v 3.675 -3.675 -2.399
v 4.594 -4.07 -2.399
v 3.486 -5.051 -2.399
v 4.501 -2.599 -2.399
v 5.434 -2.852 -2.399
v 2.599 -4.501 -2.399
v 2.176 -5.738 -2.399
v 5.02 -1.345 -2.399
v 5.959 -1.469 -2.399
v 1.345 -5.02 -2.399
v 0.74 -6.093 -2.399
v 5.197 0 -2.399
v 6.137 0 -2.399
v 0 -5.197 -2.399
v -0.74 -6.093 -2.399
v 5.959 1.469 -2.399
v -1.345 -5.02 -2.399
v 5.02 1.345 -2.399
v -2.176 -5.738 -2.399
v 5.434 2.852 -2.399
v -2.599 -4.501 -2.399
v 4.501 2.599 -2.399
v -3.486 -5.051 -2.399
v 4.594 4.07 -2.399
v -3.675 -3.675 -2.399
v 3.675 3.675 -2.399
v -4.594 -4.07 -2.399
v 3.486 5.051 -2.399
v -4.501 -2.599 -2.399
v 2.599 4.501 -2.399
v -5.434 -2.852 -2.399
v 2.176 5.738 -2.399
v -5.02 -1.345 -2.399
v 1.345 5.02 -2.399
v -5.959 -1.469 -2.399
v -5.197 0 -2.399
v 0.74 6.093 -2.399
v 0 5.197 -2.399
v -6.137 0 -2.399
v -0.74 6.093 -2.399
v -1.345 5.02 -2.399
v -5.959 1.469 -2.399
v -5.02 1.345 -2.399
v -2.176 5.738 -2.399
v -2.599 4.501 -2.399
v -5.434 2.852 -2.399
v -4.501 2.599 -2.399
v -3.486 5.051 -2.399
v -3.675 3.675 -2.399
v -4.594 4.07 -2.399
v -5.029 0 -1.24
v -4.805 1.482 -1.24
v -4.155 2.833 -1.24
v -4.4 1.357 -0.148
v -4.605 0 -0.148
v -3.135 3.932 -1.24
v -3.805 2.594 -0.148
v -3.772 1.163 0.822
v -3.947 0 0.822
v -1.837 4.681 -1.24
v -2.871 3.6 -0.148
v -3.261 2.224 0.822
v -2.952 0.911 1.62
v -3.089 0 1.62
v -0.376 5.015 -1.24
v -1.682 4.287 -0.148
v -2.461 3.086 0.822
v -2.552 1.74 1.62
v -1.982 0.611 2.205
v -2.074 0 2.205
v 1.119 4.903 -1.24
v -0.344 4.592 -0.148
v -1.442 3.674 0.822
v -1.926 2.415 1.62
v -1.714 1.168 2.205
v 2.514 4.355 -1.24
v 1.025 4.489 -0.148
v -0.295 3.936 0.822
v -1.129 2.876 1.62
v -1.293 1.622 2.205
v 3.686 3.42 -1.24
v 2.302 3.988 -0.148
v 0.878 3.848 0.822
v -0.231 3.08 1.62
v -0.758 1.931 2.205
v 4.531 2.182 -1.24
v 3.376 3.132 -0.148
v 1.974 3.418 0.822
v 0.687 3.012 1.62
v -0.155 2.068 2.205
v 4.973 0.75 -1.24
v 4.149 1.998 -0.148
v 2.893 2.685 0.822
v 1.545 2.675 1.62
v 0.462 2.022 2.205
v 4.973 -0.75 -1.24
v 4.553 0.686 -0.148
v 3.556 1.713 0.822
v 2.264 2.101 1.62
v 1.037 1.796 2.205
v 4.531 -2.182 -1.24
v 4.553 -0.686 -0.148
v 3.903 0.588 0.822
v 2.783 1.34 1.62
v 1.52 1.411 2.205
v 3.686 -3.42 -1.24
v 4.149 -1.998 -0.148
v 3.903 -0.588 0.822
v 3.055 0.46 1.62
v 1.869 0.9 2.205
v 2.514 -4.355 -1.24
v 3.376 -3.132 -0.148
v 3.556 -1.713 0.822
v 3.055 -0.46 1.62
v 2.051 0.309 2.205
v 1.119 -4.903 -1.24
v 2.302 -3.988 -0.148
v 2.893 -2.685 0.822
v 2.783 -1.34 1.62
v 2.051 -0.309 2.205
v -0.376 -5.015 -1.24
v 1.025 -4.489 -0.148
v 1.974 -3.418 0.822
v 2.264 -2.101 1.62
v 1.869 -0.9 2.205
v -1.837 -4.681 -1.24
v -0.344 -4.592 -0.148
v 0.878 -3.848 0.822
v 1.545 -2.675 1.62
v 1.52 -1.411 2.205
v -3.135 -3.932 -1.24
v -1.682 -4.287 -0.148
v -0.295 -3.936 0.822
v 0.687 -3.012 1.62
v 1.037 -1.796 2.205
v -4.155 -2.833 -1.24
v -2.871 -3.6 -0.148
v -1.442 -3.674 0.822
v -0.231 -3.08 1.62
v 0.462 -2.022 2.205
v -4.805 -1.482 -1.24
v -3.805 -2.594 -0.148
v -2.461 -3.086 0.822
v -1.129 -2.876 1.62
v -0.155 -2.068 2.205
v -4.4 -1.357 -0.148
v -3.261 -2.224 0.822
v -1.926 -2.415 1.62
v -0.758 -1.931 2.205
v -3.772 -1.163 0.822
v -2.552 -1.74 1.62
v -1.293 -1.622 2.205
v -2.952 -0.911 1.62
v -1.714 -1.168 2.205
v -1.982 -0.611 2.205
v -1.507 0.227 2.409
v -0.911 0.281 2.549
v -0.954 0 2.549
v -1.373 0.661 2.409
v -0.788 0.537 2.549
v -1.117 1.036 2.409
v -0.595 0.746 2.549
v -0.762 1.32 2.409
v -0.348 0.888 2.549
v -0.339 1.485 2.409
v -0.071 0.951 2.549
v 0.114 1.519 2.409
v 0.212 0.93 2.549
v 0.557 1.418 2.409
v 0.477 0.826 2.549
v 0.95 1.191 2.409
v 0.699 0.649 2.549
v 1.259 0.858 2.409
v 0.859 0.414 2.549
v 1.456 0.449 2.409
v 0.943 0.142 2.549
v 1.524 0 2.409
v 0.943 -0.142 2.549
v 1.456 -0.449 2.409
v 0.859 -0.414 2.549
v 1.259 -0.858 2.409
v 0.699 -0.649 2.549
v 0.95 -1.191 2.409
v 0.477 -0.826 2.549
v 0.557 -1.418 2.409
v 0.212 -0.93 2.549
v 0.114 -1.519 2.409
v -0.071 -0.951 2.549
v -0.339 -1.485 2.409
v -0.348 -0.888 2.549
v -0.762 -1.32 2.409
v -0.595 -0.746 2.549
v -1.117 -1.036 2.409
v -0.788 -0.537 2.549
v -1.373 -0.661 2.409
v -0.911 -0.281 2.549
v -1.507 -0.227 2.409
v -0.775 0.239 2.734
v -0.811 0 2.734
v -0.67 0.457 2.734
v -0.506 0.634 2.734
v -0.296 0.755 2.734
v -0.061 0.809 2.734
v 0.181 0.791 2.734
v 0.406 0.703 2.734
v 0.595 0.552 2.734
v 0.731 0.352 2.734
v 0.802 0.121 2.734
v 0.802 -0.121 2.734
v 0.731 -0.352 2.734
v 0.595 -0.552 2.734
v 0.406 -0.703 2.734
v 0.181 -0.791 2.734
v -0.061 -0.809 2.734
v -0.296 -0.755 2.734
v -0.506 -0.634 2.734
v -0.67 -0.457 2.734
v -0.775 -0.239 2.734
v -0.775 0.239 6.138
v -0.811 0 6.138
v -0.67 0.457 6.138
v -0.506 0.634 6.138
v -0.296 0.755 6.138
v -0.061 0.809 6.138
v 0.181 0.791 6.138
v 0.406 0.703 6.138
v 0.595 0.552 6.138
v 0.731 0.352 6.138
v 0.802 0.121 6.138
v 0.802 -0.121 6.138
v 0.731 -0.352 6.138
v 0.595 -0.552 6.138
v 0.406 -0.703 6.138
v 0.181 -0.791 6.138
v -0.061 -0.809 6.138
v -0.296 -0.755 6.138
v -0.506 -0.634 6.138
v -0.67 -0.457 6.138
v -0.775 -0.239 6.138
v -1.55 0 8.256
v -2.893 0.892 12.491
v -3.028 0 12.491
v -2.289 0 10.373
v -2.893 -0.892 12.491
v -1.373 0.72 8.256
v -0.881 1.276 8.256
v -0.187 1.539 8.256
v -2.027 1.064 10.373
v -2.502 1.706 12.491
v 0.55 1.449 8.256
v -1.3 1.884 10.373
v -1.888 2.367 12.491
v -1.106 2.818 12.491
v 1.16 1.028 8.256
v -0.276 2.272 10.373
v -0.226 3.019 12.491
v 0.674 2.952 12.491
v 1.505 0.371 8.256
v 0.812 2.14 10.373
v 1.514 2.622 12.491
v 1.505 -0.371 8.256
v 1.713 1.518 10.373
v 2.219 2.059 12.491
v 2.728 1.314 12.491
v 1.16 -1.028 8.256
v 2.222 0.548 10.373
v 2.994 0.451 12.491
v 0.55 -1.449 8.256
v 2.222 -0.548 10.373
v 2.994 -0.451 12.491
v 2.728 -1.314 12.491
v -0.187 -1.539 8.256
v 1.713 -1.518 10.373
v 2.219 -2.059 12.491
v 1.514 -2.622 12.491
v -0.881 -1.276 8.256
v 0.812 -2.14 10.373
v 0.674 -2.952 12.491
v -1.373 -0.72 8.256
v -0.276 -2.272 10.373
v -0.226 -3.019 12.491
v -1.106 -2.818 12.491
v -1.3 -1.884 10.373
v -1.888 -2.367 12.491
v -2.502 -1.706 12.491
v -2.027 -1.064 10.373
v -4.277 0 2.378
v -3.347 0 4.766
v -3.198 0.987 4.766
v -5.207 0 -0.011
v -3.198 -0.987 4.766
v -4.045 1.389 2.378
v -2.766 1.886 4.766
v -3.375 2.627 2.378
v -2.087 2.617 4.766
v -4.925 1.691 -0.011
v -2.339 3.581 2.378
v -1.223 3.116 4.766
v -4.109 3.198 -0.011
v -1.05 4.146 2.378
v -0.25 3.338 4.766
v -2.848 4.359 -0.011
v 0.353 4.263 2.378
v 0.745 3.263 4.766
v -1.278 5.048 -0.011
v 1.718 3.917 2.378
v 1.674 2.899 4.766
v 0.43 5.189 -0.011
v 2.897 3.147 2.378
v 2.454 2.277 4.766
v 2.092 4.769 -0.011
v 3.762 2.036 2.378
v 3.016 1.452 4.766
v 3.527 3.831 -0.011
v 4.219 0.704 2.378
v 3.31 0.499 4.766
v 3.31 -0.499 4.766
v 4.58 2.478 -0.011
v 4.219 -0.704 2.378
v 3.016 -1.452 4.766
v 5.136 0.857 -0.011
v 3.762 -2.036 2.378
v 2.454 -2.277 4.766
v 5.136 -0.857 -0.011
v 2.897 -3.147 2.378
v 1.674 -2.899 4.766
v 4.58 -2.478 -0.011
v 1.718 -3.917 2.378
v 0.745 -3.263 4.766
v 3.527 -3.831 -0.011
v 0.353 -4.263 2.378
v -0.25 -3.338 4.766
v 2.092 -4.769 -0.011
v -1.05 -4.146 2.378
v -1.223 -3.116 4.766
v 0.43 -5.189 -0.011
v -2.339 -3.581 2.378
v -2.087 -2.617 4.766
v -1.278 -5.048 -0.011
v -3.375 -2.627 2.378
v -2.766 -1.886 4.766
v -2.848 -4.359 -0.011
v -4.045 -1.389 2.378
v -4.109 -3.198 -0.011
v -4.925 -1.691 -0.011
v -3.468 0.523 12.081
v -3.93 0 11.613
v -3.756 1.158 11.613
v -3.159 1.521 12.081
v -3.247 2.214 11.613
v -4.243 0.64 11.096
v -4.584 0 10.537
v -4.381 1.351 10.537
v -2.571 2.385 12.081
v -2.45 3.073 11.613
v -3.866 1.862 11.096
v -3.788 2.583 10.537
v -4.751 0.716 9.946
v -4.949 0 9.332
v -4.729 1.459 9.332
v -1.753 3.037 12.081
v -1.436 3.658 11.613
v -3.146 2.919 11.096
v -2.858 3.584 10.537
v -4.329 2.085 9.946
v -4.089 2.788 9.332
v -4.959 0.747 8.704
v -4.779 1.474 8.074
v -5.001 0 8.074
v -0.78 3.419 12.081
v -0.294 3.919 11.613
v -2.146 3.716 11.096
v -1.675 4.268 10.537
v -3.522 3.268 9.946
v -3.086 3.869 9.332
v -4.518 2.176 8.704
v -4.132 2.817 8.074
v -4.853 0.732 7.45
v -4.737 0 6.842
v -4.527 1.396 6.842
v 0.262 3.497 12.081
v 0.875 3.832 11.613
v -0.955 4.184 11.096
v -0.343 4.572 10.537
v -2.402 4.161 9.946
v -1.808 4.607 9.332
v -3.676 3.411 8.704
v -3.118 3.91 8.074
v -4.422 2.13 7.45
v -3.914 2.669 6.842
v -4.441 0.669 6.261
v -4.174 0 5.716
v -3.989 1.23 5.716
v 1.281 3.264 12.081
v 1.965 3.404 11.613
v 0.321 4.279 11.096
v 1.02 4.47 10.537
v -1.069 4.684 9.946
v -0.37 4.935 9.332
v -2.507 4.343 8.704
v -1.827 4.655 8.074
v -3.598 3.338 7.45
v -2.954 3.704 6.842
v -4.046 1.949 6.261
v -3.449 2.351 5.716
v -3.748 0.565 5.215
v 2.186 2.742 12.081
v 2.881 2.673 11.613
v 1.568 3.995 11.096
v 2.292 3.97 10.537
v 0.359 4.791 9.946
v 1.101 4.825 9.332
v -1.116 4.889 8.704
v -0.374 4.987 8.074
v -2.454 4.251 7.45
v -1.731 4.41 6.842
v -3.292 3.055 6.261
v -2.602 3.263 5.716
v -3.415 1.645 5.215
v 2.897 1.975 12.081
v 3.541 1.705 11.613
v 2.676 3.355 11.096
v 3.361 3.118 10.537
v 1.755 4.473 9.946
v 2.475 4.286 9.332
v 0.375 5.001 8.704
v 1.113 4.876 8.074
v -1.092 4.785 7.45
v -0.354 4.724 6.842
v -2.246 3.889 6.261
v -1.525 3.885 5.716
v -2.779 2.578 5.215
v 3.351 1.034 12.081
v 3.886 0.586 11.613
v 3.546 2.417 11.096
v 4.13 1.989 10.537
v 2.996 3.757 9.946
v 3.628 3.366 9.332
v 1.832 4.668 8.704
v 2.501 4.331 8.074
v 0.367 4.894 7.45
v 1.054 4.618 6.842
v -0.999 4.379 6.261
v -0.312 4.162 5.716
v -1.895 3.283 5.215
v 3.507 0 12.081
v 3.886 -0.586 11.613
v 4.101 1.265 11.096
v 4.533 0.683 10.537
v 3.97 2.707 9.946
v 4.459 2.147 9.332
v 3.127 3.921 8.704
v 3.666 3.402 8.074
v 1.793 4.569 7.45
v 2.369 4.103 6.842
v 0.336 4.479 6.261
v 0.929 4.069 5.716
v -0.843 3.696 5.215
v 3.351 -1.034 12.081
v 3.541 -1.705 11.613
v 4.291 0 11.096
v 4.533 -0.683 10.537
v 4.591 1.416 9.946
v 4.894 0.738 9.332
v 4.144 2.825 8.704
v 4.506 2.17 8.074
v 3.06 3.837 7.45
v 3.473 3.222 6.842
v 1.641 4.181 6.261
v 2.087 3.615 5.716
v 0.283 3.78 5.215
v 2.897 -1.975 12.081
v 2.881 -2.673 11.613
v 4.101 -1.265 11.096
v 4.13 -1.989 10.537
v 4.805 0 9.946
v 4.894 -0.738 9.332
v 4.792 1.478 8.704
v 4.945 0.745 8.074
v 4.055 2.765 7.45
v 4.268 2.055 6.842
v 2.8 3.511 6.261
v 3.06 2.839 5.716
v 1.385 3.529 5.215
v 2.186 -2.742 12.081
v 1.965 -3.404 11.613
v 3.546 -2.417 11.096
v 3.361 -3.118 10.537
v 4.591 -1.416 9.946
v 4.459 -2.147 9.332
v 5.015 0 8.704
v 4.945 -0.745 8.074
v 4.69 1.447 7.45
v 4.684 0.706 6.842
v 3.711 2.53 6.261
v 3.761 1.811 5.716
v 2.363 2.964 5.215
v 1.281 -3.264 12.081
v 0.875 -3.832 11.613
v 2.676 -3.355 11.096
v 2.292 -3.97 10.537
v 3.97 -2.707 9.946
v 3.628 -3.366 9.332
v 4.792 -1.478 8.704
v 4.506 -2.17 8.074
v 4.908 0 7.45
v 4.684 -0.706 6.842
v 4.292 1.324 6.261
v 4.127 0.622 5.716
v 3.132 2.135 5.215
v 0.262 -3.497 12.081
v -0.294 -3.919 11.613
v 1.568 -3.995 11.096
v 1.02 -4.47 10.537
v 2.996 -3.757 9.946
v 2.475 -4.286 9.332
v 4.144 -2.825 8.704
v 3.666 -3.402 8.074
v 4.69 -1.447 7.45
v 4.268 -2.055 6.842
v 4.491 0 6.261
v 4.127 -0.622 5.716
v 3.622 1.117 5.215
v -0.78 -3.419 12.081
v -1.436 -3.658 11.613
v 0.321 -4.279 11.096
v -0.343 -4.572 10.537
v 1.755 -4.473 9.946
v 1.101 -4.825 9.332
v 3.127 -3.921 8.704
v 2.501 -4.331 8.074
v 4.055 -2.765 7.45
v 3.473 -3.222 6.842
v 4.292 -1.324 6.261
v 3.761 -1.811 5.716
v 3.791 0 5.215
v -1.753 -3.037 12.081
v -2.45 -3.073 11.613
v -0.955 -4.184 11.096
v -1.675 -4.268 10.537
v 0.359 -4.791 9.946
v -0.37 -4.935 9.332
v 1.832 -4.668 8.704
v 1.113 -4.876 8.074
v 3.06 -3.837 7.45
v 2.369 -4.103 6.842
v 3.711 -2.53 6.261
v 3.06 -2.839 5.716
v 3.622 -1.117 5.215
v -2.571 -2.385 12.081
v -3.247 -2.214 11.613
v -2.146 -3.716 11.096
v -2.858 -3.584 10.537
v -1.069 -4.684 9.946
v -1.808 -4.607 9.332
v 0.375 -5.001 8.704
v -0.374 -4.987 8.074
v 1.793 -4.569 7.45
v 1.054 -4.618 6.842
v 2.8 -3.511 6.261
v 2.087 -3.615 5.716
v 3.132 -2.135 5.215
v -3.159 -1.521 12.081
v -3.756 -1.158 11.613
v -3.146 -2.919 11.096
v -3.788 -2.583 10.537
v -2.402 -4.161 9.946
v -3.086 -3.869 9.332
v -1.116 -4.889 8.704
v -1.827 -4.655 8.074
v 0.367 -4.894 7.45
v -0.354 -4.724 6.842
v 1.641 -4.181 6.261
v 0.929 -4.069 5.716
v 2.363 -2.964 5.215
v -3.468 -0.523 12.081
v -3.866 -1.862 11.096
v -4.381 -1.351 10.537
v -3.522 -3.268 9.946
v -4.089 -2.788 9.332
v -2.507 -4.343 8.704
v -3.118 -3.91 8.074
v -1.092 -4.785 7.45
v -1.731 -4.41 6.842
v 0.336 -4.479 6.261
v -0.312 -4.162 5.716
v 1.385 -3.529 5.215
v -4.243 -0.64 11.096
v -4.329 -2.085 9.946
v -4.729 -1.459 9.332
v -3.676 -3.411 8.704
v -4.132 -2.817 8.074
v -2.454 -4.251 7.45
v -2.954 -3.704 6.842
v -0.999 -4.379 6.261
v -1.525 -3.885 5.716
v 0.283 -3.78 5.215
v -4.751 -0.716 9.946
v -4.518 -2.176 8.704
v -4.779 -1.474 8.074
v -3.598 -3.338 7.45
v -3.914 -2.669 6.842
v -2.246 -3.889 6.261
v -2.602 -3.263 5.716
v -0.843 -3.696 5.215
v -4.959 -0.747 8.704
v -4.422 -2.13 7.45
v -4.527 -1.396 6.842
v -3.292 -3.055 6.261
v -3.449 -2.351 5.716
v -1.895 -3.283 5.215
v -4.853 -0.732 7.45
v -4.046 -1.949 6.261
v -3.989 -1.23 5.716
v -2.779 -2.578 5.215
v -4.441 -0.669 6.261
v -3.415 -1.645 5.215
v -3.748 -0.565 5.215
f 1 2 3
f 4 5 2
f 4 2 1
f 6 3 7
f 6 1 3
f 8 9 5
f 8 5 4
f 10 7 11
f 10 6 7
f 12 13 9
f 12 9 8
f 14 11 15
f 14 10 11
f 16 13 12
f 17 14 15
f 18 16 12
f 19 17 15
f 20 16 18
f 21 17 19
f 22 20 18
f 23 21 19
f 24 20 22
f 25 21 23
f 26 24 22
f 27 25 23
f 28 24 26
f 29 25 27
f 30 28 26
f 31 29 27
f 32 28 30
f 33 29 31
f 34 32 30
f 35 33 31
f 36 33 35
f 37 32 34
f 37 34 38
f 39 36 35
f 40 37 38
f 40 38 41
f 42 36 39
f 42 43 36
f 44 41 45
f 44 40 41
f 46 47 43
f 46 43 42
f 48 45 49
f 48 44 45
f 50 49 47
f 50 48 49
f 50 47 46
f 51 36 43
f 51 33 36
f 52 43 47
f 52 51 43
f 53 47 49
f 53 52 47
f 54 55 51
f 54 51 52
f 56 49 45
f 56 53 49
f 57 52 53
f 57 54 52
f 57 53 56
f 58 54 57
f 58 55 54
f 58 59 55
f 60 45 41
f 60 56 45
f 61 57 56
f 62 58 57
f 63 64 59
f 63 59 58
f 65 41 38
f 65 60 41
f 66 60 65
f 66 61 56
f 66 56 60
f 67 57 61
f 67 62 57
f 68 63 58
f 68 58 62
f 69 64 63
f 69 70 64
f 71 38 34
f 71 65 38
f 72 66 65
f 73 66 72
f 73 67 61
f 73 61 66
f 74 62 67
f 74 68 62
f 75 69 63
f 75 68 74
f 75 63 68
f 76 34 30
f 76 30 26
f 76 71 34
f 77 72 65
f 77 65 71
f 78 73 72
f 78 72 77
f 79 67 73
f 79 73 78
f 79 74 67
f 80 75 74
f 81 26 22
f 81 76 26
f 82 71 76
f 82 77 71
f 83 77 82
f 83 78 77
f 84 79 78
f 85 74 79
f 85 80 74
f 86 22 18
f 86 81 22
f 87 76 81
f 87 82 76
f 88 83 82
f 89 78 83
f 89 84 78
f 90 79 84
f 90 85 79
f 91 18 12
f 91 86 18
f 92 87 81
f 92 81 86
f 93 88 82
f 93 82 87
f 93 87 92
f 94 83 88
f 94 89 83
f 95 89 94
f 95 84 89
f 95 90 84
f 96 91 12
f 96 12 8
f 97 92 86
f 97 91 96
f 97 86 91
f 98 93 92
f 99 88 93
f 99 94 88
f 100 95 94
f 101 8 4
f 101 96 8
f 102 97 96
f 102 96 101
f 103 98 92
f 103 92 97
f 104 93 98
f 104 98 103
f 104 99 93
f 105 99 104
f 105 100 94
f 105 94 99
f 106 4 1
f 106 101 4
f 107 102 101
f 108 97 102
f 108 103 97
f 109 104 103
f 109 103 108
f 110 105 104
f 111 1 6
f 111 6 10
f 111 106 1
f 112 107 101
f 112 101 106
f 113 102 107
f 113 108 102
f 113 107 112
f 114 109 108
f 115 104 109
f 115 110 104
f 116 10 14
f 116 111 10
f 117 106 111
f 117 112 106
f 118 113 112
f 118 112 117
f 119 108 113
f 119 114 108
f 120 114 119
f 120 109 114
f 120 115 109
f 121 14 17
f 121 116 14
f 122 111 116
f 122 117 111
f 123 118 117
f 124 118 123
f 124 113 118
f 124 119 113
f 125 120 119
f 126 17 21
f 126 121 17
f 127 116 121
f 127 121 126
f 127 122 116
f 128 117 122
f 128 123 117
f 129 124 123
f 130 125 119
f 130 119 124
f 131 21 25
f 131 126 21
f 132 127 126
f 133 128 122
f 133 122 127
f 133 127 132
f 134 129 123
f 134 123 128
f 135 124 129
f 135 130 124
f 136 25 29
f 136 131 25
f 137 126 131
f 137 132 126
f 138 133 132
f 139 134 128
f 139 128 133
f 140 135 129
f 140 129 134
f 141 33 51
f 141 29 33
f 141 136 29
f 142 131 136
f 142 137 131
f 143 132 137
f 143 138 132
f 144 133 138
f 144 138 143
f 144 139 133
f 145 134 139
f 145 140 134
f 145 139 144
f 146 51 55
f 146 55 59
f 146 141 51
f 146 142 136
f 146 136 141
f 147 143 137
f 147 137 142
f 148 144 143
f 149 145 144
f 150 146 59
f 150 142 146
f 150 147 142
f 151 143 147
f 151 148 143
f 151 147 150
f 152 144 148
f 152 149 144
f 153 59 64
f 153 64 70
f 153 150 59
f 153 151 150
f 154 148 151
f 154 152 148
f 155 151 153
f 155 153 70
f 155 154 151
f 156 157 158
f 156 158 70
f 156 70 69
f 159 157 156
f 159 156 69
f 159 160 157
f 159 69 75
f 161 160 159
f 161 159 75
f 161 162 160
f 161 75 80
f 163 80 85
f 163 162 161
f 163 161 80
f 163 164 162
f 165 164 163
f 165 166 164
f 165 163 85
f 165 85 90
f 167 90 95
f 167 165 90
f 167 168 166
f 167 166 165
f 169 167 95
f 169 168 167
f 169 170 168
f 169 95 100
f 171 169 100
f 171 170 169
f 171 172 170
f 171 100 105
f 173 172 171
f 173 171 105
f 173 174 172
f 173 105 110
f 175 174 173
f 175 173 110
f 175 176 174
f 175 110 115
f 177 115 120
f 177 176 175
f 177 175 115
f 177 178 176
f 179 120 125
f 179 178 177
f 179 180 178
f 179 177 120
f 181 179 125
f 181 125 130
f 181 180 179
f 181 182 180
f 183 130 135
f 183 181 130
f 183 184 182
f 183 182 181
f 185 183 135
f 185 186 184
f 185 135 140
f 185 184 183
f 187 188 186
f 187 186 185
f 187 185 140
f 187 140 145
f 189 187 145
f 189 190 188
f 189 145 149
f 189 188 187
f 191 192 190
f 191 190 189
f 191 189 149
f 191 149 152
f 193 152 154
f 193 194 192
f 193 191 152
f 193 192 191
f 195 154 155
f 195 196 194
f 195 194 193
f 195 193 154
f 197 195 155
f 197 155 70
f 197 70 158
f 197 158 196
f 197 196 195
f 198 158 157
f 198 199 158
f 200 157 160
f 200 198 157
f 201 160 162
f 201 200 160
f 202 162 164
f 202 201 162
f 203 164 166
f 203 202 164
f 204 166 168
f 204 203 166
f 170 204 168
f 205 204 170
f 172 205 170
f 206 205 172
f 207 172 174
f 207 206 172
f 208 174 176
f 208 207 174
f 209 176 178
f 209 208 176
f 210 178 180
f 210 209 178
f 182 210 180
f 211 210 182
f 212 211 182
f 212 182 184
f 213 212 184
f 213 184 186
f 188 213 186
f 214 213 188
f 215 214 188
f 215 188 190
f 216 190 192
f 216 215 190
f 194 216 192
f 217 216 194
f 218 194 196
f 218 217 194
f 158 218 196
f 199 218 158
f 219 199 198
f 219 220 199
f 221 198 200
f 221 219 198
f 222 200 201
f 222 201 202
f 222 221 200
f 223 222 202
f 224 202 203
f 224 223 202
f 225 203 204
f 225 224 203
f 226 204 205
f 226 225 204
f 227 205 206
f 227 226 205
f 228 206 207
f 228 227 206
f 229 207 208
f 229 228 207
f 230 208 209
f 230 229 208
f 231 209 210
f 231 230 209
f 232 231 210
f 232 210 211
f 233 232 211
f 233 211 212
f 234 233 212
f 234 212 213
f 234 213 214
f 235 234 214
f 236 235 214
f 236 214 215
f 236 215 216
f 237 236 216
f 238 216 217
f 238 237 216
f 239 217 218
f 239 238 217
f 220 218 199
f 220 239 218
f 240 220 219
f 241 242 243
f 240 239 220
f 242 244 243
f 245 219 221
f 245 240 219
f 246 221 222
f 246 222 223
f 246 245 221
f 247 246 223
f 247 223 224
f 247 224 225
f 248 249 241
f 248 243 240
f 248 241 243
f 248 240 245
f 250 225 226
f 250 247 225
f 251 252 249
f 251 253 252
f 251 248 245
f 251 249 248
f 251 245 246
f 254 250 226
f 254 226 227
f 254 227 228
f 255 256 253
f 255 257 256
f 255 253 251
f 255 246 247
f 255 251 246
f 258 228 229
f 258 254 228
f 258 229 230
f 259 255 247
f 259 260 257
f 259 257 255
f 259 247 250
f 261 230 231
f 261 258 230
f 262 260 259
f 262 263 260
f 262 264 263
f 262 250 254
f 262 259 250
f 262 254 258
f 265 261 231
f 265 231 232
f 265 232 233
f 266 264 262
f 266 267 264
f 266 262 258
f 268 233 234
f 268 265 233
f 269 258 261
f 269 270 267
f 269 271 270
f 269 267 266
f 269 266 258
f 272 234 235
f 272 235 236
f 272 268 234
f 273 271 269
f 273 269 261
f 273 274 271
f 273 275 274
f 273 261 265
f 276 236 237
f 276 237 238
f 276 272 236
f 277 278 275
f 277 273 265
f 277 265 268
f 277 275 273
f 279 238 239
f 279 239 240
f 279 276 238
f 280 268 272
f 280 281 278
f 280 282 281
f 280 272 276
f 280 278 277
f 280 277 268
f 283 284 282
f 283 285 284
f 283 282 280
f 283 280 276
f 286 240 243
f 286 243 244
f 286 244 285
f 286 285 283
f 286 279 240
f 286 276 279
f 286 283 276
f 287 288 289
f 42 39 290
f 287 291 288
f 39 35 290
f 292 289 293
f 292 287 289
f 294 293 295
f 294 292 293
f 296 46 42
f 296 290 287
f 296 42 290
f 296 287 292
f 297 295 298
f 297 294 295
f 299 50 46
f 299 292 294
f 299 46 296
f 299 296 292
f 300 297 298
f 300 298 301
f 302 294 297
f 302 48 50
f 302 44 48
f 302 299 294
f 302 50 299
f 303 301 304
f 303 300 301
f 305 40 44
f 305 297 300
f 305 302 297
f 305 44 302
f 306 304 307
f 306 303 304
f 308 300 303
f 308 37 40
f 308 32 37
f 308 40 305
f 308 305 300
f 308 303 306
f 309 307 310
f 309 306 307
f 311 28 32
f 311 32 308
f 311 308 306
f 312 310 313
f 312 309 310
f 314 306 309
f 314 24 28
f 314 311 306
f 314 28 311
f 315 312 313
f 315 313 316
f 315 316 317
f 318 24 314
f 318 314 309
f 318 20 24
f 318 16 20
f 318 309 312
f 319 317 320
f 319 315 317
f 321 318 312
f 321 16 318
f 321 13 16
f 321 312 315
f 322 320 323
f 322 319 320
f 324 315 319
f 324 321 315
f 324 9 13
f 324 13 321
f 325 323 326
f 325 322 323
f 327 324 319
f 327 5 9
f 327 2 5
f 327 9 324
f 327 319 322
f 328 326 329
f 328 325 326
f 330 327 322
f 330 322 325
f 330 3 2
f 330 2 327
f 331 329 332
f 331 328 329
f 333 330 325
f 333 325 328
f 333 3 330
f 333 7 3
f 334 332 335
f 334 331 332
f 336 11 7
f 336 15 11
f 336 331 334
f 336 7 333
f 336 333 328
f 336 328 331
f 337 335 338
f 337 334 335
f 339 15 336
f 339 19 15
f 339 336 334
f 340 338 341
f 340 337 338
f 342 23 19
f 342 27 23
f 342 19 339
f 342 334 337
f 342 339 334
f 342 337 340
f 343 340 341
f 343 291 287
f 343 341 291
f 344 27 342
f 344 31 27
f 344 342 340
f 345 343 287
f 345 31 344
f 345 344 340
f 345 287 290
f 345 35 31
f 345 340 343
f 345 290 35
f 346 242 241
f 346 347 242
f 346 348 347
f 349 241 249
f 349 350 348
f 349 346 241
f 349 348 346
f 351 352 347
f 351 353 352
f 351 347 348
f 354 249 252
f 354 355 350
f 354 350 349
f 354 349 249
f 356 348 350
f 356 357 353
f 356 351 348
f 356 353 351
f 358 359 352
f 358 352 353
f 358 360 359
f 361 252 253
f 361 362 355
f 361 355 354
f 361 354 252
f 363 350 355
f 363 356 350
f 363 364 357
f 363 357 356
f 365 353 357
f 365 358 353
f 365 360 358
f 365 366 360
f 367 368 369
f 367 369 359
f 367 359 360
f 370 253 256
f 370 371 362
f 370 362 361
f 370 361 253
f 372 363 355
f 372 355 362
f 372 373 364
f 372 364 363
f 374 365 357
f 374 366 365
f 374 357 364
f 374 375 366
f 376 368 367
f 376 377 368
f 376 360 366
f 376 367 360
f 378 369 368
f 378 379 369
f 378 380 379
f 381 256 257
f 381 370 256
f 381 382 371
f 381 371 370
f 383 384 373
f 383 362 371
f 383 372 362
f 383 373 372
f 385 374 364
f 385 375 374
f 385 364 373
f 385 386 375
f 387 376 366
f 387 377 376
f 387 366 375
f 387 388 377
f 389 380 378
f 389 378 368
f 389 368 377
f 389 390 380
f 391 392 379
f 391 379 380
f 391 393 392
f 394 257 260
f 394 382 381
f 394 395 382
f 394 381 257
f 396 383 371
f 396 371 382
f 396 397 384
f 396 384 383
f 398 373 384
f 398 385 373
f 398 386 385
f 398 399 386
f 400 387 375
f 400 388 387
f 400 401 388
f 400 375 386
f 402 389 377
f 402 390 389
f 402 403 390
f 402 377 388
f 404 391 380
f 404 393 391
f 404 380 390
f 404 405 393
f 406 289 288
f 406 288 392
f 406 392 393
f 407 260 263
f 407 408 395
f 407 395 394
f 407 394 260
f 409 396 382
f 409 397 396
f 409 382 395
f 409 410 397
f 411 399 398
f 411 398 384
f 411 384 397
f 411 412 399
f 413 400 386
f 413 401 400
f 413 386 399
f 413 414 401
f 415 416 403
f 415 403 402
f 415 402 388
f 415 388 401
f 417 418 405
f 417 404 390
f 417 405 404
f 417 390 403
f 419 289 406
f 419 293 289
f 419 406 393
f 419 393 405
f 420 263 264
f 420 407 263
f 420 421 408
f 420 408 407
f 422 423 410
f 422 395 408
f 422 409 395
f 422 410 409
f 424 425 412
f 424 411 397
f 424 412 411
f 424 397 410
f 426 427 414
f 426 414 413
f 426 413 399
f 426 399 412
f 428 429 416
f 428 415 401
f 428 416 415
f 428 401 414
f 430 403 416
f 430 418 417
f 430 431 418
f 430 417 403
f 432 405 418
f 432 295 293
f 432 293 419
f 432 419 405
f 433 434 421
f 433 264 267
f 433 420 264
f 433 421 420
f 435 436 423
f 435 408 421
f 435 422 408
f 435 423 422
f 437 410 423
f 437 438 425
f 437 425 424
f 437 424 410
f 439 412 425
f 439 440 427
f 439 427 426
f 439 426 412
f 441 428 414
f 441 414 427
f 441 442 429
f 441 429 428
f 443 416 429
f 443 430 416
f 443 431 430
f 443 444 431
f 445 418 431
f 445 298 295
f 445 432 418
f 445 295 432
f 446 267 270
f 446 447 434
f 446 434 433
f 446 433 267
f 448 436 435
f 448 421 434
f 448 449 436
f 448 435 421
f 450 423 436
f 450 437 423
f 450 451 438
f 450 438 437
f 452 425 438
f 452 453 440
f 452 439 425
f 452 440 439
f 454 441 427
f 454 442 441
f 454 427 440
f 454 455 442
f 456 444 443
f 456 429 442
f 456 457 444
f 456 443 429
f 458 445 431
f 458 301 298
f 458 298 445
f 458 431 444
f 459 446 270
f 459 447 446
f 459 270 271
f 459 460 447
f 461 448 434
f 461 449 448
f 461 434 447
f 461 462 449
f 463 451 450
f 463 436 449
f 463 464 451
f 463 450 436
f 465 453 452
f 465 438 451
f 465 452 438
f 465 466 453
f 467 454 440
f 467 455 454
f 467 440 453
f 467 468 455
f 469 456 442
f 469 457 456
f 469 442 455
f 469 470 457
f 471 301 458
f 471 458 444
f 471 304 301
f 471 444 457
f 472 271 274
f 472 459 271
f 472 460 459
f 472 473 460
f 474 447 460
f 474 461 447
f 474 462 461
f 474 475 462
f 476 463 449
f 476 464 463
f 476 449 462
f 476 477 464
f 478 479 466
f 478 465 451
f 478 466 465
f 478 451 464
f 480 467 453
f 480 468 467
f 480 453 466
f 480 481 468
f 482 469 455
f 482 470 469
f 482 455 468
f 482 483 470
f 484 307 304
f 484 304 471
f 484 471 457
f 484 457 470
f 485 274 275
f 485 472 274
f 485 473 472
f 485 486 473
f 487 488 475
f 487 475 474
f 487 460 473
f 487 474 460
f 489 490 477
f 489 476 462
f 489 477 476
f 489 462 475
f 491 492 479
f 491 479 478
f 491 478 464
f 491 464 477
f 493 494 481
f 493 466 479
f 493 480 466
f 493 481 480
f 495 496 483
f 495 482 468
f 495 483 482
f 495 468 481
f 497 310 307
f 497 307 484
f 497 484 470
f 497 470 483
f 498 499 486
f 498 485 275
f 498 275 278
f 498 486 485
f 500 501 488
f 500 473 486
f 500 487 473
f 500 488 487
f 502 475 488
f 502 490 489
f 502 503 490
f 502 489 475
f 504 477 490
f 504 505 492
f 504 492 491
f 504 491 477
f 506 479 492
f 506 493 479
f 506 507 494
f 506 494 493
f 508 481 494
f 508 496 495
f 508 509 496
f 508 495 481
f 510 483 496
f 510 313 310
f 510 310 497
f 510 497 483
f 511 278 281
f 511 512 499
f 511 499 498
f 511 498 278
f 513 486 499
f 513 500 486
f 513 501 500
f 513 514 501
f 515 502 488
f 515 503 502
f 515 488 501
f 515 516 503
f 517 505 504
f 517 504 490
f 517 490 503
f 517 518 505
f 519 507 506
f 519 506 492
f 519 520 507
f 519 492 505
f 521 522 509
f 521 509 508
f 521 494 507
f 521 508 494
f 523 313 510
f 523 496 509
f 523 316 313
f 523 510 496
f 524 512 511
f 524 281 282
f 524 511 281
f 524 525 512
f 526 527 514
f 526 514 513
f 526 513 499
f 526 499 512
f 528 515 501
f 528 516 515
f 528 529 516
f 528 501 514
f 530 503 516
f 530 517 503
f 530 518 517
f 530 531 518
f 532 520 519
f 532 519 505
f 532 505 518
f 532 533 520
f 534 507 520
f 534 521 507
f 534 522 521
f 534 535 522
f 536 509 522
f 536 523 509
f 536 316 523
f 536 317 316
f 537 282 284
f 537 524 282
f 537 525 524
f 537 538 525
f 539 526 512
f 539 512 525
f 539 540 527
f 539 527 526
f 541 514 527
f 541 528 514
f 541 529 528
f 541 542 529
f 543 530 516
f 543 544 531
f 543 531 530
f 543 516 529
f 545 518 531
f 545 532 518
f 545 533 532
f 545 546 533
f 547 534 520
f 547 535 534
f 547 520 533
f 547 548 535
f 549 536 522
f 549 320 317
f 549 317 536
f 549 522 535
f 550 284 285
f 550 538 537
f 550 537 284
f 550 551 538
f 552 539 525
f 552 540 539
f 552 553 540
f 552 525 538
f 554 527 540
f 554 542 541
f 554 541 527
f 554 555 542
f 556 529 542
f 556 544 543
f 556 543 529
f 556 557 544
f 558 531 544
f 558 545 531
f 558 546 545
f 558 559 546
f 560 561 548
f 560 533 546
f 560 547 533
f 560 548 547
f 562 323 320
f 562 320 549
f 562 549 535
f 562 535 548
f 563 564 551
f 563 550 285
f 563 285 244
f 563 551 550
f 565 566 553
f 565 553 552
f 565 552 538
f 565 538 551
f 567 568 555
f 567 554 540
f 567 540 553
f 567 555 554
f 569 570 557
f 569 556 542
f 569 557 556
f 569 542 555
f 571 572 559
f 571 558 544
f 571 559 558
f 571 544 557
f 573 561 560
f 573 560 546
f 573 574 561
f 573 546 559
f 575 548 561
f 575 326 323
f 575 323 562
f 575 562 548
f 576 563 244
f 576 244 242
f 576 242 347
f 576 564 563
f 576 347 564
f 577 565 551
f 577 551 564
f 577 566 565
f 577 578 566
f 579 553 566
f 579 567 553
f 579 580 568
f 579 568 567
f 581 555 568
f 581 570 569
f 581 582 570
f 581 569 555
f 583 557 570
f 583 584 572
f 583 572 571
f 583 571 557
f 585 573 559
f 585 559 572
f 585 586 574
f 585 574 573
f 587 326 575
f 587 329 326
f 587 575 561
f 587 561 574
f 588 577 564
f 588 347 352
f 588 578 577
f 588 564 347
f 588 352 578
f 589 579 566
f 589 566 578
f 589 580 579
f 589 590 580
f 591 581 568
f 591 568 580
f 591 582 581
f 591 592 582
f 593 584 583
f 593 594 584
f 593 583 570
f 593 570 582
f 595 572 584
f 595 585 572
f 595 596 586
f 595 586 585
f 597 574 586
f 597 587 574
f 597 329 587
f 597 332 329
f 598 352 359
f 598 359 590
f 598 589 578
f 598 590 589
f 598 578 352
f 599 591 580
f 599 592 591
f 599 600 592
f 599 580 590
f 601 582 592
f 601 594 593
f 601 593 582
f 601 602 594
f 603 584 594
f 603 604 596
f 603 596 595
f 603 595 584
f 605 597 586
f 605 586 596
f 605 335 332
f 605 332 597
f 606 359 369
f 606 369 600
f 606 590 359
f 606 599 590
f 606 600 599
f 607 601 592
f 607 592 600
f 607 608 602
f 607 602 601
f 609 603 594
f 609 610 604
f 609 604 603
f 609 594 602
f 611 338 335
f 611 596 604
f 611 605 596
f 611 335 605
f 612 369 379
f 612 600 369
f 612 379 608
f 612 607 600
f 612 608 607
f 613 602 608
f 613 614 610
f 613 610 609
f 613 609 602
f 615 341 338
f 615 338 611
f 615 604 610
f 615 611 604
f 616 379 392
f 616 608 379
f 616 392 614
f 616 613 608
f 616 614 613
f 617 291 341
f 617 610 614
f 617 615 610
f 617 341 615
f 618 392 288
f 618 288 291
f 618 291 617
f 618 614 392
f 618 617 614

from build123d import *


with BuildPart() as f1:
    # F0 (on Front) → F1 (revolve)
    with BuildSketch(Plane.XZ):
        with BuildLine():
            Line((-0.811438, 6.137778), (-3.027734, 12.491356))
            ThreePointArc((-3.027734, 12.491356), (-5.014969, 8.704305), (-3.347156, 4.766126))
            Line((-3.347156, 4.766126), (-6.137301, -2.39948))
            Line((-6.137301, -2.39948), (-5.197422, -2.39948))
            ThreePointArc((-5.197422, -2.39948), (-3.947176, 0.822017), (-0.953815, 2.548559))
            Line((-0.953815, 2.548559), (-0.811438, 2.733914))
            Line((-0.811438, 2.733914), (-0.811438, 6.137778))
        make_face()
    revolve(axis=Axis((0, 0, 4.58246), (0, 0, -1)))


solid = f1.part
